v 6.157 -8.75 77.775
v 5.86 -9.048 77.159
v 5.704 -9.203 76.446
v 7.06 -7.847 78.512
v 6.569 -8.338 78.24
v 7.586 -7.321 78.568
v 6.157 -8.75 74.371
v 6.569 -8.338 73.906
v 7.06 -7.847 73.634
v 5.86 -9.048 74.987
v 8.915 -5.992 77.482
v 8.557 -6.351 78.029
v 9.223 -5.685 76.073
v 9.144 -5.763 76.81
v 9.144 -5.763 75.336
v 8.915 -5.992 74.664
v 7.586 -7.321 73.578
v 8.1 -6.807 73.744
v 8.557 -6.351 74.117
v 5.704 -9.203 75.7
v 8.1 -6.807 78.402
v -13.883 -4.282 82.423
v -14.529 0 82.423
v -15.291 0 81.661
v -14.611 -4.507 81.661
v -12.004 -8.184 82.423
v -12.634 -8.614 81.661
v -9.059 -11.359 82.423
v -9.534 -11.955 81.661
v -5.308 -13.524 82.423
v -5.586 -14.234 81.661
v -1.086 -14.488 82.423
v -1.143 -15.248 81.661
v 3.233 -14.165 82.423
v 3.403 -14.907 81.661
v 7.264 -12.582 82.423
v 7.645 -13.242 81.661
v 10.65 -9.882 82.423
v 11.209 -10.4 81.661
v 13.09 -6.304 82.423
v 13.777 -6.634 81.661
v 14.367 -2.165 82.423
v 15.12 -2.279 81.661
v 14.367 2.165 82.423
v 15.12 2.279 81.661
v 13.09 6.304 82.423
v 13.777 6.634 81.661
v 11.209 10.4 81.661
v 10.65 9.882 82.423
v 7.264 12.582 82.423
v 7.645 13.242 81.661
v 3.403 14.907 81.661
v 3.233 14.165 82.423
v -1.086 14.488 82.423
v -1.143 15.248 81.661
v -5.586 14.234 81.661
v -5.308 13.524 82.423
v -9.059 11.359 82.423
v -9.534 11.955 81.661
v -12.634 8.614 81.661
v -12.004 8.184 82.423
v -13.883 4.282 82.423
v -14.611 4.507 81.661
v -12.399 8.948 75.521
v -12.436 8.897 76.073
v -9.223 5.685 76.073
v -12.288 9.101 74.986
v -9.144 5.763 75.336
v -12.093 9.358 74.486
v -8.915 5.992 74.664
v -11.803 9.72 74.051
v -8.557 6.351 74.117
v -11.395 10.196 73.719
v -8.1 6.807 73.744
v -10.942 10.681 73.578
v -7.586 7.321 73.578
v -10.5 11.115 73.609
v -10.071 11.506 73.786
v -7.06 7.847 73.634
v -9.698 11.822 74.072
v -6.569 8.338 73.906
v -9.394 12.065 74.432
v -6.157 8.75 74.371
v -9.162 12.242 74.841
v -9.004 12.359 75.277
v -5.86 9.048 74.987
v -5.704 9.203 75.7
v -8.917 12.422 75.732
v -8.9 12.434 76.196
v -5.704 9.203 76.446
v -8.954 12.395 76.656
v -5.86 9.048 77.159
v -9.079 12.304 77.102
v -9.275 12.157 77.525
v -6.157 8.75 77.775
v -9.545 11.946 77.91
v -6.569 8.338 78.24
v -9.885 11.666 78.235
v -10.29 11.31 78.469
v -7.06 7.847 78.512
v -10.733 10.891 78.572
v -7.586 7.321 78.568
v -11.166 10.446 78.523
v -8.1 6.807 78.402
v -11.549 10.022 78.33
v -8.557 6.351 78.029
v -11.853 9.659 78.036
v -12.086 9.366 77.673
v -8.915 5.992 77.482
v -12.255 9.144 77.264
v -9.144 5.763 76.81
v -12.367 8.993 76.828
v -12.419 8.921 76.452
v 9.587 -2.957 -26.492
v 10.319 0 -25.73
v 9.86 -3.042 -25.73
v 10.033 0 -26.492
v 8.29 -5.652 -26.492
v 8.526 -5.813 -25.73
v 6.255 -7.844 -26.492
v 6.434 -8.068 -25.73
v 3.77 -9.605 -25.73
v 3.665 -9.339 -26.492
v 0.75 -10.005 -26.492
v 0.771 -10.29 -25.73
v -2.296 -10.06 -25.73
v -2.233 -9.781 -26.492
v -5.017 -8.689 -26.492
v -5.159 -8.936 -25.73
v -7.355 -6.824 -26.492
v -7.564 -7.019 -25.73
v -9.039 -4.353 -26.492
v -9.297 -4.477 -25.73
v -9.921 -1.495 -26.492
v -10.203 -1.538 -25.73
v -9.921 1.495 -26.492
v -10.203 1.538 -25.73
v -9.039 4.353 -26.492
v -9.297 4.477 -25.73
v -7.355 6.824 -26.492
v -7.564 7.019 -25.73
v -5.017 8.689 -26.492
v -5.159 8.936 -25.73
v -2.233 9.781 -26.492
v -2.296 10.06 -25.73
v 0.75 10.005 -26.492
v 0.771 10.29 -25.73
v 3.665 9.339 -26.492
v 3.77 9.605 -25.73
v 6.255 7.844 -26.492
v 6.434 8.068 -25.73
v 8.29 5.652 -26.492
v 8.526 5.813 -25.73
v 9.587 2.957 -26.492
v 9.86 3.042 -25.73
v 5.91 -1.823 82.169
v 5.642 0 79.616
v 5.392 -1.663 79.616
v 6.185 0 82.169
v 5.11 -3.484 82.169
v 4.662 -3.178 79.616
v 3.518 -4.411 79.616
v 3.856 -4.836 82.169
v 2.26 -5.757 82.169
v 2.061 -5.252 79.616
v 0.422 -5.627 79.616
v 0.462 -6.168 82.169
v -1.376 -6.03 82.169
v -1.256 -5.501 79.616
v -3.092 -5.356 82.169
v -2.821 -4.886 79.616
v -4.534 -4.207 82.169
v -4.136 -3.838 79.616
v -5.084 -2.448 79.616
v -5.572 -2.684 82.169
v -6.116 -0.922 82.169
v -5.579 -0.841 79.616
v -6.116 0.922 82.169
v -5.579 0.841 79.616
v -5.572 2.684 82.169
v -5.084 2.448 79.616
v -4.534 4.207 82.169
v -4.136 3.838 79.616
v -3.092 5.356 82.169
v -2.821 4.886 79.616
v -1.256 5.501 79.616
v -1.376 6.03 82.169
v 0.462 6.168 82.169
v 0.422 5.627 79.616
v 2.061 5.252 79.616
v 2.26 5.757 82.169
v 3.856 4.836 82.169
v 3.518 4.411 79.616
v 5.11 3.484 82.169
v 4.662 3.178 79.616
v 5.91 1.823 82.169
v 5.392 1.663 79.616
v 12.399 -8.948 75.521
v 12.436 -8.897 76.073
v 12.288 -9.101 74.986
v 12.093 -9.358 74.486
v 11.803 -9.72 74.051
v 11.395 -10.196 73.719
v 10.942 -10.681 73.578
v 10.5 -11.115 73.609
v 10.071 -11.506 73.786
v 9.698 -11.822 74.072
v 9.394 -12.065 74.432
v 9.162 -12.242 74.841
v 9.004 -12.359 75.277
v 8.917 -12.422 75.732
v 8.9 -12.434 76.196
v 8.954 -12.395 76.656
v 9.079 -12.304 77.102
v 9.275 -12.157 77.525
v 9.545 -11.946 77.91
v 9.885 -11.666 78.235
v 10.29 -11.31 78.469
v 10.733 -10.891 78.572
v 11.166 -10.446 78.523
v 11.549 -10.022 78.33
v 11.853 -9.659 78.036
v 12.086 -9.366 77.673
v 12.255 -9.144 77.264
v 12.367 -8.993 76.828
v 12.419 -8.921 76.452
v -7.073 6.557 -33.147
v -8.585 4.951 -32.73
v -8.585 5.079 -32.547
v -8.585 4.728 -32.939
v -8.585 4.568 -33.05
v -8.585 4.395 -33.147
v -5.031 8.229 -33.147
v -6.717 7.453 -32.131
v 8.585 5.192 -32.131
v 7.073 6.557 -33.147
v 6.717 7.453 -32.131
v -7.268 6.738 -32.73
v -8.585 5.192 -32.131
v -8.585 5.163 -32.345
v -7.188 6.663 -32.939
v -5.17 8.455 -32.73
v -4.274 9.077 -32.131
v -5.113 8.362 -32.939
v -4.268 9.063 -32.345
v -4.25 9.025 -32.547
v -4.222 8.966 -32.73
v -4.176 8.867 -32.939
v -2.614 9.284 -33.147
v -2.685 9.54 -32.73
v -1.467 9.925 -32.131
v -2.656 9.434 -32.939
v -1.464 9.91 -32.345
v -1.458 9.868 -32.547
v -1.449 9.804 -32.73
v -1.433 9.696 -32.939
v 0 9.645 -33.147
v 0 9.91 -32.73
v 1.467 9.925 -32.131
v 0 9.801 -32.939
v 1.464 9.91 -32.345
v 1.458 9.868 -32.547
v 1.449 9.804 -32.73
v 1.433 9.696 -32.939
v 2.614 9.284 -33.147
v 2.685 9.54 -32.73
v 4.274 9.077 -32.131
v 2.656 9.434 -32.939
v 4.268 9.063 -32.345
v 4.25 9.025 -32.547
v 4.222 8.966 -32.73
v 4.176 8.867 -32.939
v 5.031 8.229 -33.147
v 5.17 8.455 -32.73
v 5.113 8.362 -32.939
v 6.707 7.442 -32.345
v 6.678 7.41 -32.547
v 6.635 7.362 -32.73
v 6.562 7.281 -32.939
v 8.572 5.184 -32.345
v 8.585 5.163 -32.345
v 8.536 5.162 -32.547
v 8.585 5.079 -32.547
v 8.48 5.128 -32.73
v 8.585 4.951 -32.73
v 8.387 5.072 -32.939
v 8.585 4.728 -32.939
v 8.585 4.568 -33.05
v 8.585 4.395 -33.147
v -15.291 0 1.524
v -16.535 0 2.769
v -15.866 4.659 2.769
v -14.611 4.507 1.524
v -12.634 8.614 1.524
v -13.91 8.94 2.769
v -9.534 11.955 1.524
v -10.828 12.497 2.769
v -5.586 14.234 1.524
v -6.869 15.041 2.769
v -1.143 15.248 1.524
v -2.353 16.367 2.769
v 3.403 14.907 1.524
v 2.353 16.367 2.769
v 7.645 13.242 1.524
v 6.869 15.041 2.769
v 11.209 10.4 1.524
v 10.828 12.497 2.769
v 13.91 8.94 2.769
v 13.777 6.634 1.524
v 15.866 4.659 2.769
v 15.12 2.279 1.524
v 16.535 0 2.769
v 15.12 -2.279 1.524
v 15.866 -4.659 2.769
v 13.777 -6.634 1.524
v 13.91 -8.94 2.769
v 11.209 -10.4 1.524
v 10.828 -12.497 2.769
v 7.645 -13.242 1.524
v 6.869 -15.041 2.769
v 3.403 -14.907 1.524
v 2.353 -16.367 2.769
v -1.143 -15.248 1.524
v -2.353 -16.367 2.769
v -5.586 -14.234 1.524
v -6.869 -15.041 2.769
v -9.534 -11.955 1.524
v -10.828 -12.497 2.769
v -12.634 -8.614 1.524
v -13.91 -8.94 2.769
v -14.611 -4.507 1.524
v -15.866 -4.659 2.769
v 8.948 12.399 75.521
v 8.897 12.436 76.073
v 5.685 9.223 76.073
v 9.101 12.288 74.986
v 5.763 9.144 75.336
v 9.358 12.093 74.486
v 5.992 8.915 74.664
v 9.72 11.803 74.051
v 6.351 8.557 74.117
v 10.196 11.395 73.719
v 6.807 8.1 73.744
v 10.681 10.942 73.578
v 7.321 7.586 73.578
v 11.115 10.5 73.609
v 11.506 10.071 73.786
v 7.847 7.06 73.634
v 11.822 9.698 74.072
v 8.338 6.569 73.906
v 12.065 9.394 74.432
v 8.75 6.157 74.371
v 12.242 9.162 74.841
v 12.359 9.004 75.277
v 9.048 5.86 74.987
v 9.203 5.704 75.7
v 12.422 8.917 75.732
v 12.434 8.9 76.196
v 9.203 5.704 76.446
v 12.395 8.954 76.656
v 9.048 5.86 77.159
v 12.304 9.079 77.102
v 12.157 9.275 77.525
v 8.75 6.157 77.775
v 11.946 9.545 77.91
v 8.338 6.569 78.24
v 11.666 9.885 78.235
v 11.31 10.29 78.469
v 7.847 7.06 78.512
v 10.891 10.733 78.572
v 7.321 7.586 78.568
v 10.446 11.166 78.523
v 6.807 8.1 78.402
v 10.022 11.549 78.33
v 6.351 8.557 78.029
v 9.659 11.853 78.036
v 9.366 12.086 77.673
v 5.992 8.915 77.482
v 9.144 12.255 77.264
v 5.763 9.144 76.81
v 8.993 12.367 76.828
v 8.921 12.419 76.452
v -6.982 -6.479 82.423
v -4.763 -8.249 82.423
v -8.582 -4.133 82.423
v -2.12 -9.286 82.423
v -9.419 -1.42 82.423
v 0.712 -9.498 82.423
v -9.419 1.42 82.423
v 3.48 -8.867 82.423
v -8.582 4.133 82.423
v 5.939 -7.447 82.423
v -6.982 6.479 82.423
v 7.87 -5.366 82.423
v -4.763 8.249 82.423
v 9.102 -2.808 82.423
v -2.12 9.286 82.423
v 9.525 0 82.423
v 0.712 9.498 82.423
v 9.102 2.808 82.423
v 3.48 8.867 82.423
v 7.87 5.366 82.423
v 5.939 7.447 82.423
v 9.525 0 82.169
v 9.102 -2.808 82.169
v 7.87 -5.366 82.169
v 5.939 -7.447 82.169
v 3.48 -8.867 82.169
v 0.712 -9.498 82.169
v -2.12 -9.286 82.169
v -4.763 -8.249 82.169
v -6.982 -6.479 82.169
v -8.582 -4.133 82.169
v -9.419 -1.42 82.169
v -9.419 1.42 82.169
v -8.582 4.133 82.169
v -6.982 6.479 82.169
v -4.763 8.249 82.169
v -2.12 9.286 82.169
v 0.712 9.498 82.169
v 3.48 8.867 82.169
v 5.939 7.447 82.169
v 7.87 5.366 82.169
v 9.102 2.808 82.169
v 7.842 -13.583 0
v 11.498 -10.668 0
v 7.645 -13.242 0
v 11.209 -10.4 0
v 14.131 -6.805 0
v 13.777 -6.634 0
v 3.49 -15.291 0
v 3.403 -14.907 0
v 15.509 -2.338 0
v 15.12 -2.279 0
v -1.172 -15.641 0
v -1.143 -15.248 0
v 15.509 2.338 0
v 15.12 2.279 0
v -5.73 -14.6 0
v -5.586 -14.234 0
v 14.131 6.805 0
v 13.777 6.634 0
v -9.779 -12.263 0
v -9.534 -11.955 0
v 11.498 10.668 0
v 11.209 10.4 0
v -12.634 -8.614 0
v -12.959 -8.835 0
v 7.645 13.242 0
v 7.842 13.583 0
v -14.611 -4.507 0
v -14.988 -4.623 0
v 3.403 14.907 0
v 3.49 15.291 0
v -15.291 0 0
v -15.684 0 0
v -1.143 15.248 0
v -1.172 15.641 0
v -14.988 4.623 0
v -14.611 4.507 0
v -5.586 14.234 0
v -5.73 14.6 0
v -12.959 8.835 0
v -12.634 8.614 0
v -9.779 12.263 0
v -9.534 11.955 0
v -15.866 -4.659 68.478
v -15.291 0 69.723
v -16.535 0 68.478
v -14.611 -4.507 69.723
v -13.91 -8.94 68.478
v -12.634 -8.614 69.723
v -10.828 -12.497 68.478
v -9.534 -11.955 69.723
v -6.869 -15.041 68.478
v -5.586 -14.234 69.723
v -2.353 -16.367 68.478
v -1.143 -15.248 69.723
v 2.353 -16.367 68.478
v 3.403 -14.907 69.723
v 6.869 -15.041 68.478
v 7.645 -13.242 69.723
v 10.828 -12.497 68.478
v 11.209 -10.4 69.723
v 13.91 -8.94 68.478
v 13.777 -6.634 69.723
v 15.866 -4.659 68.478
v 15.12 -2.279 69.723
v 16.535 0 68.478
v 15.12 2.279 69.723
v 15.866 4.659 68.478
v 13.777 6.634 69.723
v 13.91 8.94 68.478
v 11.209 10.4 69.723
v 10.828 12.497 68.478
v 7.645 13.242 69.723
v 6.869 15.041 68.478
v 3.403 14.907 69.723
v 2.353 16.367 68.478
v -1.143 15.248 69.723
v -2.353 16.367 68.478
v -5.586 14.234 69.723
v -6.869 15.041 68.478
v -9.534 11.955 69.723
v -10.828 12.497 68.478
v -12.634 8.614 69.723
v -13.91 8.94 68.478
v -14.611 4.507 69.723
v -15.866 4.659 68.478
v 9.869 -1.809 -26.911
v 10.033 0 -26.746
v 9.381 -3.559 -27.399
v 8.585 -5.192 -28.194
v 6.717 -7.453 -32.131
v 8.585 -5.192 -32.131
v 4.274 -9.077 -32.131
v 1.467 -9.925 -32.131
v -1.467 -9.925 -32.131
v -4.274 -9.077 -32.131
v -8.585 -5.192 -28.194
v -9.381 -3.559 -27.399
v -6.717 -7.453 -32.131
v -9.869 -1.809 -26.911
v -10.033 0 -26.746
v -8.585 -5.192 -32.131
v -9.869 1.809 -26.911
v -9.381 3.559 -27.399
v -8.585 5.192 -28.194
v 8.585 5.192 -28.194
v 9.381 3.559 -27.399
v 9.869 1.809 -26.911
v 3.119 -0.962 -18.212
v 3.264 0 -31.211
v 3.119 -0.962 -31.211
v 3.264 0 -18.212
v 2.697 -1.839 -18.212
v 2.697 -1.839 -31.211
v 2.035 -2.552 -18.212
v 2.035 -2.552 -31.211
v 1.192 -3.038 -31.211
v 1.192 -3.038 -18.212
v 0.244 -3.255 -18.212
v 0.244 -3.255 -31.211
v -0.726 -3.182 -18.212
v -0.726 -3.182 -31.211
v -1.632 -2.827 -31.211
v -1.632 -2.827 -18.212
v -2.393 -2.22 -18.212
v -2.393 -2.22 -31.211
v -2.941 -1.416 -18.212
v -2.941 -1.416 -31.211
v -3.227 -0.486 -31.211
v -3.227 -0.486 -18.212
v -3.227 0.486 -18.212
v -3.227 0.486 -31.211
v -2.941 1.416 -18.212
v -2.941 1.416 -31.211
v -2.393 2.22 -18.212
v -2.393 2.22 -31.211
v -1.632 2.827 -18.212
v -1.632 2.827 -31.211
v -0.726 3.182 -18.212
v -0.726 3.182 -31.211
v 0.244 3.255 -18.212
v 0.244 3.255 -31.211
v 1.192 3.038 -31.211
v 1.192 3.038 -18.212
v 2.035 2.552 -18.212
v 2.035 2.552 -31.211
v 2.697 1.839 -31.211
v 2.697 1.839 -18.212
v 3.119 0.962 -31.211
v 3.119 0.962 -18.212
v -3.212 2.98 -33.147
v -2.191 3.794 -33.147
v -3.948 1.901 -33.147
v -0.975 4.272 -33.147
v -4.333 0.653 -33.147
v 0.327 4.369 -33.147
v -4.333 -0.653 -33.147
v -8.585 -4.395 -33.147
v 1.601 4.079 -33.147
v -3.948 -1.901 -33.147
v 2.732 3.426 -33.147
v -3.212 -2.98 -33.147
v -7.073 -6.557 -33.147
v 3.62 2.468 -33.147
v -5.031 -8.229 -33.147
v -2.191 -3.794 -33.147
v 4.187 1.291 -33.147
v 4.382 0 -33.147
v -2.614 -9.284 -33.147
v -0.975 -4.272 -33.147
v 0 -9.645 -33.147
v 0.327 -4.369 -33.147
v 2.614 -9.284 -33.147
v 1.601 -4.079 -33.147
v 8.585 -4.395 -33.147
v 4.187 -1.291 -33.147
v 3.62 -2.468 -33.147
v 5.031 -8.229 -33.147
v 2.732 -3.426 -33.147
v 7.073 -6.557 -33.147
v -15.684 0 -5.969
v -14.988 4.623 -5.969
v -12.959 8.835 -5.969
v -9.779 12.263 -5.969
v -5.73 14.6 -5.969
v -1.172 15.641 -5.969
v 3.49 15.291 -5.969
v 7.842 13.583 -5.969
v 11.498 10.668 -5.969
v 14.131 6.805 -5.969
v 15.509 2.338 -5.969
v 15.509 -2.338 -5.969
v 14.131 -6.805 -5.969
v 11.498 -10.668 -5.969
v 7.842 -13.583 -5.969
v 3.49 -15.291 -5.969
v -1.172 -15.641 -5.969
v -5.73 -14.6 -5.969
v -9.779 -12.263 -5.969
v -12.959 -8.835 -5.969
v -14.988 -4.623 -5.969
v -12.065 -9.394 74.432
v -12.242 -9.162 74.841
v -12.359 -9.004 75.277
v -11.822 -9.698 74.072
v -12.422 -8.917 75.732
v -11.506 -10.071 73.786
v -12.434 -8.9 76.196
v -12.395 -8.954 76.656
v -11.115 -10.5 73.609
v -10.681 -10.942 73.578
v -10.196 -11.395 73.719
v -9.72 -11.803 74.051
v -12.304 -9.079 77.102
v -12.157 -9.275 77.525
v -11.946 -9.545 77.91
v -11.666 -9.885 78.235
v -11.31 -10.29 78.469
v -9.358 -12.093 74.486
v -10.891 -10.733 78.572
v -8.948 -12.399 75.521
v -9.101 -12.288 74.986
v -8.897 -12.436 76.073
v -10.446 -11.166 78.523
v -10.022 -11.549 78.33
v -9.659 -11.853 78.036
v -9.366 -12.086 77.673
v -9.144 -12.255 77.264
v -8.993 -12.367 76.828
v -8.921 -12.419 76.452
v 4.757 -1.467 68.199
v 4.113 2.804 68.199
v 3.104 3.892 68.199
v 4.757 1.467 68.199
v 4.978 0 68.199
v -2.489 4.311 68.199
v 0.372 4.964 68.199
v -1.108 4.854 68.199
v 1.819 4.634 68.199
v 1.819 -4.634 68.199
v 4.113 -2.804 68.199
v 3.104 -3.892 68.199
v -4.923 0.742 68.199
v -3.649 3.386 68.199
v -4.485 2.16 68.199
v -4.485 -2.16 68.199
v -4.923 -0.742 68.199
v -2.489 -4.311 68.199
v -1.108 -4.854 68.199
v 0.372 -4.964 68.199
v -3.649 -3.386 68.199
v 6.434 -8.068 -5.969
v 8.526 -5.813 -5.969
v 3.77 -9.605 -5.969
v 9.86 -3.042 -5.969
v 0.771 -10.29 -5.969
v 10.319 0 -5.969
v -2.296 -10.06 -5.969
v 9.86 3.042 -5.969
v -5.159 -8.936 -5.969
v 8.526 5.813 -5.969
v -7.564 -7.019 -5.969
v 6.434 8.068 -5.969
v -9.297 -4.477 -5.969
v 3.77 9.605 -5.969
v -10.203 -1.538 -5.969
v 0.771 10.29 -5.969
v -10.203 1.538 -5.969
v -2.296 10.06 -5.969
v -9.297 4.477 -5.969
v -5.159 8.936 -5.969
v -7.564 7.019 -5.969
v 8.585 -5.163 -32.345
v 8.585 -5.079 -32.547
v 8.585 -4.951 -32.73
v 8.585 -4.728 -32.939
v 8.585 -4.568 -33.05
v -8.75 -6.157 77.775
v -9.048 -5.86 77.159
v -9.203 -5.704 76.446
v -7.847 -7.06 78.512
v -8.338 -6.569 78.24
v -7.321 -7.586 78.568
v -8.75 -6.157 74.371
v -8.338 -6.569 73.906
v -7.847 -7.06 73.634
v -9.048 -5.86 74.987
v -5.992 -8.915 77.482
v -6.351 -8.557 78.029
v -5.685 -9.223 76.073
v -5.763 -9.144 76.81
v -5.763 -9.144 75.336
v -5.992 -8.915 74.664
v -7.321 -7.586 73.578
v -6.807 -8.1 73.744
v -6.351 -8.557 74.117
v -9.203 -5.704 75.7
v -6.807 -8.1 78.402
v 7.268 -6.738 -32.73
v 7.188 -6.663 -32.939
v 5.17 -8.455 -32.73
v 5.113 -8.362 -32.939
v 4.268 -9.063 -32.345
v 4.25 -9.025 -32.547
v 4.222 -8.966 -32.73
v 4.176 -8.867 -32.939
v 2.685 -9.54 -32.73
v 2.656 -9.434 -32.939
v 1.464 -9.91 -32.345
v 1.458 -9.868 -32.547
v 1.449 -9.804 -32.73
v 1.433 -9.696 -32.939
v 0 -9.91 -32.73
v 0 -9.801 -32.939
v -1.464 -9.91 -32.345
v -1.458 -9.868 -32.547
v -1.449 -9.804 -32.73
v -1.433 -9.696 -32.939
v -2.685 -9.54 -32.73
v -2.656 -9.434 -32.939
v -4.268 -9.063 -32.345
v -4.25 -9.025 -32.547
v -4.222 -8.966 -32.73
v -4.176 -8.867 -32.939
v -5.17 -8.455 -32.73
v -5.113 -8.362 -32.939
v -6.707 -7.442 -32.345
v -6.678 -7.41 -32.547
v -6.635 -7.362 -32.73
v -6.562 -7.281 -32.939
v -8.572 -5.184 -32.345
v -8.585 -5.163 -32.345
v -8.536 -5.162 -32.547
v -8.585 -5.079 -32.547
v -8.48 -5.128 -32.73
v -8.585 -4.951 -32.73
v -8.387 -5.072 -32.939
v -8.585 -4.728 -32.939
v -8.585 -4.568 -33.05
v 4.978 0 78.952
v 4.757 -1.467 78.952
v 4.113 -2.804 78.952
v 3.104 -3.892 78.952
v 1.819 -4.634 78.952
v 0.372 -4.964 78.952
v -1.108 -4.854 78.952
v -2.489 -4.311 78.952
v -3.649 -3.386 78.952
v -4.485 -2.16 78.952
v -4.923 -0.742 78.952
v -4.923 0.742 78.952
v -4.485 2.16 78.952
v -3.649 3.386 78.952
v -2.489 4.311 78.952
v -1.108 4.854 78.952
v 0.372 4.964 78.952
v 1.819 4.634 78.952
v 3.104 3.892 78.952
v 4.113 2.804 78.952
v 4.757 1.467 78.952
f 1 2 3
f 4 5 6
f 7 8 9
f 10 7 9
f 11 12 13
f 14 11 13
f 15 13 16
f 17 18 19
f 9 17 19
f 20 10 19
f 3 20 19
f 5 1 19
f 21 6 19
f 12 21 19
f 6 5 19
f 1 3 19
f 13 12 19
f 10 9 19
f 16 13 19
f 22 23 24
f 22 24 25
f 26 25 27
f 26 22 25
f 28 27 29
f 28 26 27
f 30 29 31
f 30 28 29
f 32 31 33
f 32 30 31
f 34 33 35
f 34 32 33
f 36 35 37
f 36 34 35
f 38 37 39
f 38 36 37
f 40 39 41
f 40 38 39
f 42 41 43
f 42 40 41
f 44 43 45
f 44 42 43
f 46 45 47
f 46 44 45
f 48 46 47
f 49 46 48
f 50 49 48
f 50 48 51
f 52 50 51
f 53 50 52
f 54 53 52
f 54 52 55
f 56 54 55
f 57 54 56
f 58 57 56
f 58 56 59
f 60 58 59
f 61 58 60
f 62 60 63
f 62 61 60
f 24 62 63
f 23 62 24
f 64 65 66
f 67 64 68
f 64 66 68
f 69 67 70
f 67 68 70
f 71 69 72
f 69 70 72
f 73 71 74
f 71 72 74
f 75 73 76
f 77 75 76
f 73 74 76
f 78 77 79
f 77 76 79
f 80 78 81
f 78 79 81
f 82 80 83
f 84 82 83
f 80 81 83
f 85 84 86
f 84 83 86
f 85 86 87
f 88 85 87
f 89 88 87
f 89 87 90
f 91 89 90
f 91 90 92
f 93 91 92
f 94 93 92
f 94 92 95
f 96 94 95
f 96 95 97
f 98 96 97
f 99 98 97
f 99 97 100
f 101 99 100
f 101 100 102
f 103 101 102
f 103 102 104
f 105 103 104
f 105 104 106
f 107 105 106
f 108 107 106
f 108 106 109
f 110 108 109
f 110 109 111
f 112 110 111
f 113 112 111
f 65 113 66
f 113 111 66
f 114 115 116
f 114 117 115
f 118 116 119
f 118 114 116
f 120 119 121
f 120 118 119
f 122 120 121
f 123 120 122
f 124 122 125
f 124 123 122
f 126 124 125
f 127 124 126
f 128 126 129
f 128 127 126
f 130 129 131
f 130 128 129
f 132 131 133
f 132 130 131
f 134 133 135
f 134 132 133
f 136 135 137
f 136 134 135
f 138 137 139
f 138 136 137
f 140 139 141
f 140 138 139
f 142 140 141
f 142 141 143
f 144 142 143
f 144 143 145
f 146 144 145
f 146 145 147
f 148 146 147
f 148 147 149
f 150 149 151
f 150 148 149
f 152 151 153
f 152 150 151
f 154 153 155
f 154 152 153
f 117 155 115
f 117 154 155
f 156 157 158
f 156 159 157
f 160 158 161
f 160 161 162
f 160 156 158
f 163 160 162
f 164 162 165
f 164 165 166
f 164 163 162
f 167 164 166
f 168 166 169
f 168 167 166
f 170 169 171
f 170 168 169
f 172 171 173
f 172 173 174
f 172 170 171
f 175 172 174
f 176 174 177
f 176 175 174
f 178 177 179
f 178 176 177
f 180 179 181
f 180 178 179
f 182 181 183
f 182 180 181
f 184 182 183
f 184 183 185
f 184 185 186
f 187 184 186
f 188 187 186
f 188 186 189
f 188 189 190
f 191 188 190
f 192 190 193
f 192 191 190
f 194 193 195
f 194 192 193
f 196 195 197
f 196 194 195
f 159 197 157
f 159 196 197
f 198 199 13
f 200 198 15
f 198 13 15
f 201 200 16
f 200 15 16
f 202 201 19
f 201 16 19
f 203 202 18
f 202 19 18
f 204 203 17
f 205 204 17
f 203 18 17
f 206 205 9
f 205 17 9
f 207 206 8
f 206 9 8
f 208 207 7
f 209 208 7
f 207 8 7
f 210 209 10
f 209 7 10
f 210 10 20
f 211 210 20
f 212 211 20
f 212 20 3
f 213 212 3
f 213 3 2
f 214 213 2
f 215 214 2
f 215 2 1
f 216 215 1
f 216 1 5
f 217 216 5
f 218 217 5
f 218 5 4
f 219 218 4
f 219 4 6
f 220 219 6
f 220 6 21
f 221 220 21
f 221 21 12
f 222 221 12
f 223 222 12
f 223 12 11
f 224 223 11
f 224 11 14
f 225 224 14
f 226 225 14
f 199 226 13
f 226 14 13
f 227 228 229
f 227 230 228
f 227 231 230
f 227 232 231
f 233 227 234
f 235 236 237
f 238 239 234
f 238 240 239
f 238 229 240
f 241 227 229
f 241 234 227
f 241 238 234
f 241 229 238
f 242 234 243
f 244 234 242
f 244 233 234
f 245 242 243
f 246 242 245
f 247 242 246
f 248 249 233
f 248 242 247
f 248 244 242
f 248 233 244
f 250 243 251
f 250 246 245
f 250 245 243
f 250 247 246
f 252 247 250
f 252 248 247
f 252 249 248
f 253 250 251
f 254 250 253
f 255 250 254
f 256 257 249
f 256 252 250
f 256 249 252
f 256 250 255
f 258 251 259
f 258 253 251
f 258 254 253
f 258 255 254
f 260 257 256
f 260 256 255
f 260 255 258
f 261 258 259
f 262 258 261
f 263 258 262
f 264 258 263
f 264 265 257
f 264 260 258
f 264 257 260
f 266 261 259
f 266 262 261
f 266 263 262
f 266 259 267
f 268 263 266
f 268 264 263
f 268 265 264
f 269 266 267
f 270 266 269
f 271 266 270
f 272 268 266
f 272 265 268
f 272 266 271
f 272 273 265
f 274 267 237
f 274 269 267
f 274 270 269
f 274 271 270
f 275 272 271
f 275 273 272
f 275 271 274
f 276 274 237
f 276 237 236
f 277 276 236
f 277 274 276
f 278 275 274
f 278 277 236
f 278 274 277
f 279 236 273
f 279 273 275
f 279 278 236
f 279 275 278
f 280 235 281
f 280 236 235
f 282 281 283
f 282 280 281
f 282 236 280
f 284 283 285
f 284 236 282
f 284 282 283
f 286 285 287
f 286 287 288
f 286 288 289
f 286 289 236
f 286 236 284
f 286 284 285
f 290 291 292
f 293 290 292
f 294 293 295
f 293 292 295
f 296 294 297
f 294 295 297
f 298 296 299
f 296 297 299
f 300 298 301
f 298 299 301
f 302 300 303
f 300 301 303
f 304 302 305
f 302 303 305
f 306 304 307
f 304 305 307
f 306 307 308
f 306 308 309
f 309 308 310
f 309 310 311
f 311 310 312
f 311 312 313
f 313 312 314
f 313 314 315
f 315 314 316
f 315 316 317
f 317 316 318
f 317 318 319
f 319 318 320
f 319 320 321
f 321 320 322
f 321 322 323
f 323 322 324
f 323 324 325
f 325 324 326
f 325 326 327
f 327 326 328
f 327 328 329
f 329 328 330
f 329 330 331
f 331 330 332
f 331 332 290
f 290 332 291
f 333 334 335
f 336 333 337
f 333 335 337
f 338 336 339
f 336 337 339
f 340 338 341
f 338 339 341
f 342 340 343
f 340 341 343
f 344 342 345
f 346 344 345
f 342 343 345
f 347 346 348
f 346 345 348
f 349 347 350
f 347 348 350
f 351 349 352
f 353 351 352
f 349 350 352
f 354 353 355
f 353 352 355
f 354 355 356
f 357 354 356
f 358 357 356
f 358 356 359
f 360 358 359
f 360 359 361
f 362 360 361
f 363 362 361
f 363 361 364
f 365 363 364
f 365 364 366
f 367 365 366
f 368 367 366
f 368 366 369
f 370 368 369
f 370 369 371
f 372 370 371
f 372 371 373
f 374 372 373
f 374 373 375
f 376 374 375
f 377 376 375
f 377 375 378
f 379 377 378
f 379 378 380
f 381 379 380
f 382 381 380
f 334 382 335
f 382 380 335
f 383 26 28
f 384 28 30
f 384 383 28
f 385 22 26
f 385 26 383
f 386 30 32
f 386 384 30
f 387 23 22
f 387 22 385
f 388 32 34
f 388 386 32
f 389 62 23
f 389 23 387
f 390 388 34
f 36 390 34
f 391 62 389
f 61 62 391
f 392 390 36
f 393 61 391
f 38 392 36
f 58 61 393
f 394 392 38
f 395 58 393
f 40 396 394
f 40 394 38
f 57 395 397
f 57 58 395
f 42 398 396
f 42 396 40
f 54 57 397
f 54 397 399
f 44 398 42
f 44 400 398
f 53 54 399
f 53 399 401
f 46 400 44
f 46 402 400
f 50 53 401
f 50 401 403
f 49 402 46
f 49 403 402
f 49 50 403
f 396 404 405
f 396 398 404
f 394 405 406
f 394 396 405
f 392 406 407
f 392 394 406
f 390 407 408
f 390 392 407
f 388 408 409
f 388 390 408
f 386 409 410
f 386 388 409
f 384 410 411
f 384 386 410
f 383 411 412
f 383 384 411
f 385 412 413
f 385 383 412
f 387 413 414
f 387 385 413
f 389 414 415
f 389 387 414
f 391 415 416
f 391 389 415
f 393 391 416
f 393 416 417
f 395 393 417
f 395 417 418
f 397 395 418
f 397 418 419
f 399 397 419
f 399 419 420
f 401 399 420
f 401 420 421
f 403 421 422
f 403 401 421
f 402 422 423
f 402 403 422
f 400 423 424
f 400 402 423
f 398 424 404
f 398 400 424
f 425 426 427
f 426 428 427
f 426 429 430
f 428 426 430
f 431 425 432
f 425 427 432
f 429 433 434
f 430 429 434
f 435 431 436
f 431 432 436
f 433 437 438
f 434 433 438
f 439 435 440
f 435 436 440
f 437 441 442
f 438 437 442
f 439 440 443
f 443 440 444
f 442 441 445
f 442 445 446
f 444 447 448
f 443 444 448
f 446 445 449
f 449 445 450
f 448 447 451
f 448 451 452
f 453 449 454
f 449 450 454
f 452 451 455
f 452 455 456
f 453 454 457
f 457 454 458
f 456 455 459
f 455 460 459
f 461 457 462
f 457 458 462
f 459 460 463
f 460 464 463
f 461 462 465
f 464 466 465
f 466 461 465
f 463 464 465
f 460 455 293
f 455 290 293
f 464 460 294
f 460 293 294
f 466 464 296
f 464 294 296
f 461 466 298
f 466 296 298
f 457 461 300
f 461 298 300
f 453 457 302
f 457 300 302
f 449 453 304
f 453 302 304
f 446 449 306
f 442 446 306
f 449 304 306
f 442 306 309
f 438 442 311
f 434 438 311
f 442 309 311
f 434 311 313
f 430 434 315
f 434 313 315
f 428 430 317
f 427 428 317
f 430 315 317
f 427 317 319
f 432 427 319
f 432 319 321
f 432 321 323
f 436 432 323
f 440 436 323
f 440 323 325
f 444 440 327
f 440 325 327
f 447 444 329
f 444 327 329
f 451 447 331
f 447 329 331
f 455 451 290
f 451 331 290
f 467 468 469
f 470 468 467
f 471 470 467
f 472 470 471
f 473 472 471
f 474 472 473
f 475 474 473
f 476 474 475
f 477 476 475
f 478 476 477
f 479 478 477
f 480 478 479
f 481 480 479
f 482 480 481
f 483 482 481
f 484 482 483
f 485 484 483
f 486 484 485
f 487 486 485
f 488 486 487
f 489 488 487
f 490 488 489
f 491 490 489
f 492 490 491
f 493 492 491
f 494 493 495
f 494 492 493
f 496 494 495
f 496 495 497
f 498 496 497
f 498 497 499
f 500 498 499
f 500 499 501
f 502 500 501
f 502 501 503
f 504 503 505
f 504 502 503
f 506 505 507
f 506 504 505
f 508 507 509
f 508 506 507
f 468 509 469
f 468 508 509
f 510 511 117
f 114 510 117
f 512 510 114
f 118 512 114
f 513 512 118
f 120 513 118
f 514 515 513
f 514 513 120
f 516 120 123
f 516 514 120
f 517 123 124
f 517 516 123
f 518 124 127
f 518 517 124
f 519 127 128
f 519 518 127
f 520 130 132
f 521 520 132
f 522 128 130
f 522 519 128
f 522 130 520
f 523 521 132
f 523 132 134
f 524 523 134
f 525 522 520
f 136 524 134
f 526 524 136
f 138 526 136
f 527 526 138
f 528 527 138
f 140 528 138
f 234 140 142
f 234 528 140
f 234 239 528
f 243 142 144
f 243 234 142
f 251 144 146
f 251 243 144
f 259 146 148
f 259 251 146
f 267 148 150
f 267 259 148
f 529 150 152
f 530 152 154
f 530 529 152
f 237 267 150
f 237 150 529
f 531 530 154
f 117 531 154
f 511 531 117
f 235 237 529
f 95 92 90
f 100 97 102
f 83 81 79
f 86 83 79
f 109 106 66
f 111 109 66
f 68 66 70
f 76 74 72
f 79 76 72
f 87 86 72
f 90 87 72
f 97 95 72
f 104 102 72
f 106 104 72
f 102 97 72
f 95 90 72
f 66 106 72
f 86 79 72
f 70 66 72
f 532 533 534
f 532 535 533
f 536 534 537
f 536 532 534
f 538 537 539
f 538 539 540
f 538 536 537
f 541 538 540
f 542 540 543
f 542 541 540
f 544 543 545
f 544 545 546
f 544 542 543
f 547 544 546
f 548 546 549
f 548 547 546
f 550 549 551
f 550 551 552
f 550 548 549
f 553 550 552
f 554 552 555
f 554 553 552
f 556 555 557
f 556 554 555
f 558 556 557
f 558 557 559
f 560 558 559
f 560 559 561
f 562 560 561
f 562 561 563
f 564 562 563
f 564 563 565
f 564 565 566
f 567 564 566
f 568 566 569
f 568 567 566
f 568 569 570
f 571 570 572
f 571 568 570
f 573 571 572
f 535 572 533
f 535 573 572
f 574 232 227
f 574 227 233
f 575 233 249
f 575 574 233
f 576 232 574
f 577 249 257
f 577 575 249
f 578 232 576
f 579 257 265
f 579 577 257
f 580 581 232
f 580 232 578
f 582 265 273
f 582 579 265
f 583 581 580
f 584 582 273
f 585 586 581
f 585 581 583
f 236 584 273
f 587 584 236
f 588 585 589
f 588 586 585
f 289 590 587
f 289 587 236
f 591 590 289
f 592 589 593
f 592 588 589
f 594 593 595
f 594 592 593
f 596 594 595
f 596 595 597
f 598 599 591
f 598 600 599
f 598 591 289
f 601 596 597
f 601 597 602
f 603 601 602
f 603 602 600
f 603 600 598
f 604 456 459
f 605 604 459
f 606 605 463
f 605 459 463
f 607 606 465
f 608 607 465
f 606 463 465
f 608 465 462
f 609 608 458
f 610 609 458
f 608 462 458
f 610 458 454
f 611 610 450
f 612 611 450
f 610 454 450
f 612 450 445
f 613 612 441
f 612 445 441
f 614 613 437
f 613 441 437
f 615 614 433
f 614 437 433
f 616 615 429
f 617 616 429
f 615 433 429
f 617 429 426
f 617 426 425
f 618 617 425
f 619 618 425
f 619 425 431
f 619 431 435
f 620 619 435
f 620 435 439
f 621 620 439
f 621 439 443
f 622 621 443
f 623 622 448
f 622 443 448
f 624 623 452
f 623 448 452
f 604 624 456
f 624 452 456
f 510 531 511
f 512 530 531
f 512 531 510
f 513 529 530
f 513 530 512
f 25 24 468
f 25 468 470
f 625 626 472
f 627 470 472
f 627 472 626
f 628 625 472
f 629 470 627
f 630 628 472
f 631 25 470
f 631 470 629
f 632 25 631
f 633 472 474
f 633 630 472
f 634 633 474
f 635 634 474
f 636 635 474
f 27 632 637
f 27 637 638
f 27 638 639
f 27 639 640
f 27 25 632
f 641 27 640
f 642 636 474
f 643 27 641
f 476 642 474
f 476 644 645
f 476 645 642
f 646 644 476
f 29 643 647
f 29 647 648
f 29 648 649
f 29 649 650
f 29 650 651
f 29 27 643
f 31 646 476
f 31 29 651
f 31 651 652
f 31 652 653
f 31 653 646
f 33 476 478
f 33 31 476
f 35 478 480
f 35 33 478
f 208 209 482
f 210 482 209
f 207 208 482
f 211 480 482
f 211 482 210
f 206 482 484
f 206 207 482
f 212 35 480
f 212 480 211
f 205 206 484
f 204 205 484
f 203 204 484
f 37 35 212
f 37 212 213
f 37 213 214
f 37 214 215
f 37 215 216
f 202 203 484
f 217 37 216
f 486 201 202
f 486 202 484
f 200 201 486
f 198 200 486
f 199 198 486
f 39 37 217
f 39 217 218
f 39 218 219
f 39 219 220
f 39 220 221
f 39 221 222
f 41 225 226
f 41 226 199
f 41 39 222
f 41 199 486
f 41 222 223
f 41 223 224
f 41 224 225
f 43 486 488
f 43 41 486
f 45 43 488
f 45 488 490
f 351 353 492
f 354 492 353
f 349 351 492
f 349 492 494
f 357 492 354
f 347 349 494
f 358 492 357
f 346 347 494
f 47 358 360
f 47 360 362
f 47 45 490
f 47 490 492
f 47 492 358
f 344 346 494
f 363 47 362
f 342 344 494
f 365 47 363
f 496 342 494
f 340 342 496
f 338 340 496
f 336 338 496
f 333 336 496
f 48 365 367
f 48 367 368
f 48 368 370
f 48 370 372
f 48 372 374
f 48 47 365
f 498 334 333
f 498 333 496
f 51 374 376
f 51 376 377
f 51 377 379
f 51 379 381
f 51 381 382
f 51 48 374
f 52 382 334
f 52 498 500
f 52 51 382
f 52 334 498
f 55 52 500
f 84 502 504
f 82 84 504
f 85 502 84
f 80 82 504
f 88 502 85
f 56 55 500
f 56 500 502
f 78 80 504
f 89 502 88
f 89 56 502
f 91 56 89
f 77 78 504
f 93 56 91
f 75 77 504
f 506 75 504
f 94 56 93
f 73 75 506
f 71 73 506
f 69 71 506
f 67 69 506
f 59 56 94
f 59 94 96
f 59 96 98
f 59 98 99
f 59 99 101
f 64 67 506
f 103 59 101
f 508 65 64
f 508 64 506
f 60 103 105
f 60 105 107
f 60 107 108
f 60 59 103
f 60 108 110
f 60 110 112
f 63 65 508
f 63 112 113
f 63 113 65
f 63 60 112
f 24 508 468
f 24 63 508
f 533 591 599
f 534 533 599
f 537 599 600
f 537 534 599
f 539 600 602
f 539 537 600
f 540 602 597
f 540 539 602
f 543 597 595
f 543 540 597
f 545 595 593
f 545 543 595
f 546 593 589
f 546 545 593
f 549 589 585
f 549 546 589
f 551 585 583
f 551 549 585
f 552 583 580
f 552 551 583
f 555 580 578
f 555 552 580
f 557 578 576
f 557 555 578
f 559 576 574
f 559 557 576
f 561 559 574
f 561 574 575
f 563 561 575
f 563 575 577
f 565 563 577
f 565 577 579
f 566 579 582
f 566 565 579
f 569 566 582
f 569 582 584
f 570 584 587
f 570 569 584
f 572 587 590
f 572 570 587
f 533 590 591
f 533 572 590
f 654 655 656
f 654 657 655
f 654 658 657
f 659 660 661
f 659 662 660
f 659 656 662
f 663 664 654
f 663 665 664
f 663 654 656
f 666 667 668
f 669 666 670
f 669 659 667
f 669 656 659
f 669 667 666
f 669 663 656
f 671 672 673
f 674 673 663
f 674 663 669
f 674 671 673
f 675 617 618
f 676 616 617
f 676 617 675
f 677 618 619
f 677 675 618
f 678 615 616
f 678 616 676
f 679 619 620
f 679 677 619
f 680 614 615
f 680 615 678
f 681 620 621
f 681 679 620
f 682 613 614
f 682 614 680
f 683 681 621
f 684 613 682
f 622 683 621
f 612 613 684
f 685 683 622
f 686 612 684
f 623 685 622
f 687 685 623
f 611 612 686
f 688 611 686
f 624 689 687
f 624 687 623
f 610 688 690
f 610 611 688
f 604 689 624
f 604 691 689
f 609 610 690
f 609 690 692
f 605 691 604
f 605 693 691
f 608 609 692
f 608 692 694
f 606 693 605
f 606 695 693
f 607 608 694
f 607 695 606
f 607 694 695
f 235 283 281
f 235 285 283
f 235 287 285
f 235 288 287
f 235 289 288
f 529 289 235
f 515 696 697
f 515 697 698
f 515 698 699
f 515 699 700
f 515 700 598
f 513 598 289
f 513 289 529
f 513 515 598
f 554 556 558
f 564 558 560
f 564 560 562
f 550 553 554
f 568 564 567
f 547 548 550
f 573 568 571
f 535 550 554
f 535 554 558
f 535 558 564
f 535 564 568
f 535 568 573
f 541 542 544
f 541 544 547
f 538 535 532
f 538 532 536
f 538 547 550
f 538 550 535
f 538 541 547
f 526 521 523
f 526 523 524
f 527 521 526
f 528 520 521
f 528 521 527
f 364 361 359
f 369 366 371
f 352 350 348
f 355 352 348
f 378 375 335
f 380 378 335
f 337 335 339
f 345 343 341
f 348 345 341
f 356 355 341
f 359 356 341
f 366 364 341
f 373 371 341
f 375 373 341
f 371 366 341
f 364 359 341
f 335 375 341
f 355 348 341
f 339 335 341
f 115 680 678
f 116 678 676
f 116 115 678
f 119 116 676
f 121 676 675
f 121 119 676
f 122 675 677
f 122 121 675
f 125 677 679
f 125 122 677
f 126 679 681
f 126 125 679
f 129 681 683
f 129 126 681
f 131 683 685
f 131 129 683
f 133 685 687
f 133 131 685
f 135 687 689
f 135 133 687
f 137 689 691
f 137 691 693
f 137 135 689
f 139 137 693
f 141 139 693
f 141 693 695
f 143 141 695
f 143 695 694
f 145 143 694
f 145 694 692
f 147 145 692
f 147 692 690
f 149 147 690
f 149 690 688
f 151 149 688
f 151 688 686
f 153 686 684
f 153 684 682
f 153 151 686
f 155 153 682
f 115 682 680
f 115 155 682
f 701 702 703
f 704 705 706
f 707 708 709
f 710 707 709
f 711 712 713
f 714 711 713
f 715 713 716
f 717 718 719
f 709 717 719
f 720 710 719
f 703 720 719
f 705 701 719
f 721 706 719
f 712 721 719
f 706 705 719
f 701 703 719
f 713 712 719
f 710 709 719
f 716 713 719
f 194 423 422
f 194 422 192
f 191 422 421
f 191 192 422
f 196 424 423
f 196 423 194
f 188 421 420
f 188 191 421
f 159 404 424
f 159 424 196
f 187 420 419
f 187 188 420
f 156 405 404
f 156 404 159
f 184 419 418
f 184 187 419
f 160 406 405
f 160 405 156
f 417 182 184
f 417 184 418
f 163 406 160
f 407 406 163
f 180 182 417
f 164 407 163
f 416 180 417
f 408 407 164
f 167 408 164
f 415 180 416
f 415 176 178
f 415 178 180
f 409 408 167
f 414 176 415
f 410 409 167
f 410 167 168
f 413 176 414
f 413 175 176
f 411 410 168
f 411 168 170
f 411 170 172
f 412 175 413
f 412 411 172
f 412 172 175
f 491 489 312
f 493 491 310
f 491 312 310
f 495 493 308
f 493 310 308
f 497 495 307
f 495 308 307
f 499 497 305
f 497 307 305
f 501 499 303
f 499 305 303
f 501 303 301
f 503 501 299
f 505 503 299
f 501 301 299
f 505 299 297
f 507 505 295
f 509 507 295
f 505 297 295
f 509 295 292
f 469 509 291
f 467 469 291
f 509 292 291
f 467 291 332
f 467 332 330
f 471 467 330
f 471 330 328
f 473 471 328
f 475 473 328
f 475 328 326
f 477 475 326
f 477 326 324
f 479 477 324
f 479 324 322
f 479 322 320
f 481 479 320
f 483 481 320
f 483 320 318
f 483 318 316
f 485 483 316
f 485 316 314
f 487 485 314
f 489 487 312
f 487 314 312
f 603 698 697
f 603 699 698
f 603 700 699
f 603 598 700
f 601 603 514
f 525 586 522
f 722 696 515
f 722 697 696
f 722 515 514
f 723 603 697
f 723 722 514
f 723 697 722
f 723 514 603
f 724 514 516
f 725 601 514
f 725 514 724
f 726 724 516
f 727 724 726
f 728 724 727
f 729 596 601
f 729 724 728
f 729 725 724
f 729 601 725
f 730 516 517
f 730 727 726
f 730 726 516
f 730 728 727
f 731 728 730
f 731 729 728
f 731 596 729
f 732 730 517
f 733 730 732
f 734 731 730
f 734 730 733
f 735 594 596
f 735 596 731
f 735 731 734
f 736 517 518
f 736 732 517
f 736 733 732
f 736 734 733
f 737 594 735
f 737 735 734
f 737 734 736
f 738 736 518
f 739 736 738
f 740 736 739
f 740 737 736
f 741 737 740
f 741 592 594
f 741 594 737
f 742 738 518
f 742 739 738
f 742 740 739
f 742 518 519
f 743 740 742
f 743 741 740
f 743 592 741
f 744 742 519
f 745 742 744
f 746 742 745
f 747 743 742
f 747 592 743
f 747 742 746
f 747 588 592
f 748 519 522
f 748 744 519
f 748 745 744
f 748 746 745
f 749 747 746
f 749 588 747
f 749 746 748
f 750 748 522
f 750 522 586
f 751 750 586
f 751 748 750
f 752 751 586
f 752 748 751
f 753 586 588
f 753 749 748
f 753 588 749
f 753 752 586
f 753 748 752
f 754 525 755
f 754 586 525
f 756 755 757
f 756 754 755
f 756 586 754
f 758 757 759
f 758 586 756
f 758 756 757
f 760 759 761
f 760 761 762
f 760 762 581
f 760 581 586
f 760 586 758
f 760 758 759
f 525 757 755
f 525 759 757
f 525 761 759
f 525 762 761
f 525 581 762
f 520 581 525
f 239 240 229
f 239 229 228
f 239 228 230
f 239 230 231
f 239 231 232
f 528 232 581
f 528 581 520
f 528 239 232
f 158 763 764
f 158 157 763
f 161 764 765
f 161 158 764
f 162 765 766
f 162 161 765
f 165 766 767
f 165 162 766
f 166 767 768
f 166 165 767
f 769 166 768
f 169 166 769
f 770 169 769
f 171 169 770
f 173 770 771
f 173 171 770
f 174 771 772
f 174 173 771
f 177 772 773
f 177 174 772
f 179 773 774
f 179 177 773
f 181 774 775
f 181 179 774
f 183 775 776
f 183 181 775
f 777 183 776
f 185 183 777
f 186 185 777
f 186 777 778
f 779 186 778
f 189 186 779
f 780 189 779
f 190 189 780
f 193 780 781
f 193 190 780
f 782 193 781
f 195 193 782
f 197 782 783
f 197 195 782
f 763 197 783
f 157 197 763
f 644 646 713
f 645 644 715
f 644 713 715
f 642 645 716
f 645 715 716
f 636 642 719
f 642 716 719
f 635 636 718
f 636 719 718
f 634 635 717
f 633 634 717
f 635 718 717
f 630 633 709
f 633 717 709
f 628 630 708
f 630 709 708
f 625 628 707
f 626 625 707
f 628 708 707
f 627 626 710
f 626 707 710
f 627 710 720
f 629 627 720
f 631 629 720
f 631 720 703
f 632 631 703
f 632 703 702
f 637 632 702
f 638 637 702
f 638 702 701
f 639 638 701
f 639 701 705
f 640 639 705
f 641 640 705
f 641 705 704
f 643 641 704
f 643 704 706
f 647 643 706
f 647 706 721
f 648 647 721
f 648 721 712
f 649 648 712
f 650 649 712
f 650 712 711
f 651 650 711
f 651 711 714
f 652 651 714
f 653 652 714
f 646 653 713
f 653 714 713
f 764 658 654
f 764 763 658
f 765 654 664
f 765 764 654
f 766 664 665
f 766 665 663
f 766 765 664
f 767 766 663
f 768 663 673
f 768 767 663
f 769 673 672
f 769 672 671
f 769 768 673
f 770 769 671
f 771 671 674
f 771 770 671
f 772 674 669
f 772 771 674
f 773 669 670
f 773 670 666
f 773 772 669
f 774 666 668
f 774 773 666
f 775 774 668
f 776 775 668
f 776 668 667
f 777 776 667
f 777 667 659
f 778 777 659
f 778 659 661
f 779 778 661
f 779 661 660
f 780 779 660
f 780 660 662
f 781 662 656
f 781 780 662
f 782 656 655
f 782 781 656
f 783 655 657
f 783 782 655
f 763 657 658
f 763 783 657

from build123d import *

# Parameters (mm, degrees)
SKETCH1_R          = 16.5354
EXTRUDE1_DEPTH     = 82.423
CHAMFER1_SIZE      = 0.762
SKETCH6_R          = 15.6845
EXTRUDE2_DEPTH     = 5.969
SKETCH7_W          = 27.178
SKETCH7_H          = 10.31875
CUT_EXTRUDE4_DEPTH = 19.84248
HOLE1_D            = 5.0038
HOLE1_DEPTH        = 4.7498
CIRPATTERN1_COUNT  = 4


with BuildPart() as part:
    # Sketch1 → Extrude1 (new body)
    with BuildSketch(Plane.XY):
        Circle(SKETCH1_R)
    extrude(amount=EXTRUDE1_DEPTH)

    # Sketch2 → Cut-Revolve1 (revolve, cut)
    with BuildSketch(Plane(origin=(0, 0, 0), x_dir=(1, 0, 0), z_dir=(0, 1, 0)), mode=Mode.PRIVATE) as cut_revolve1_sk:
        Polygon((16.5354, -82.423), (16.5354, -68.4784), (15.2908, -69.723), (15.2908, -82.423), align=None)
    revolve(cut_revolve1_sk.sketch.rotate(Axis((0, 0, 0), (0, 0, 1)), 180), axis=Axis((0, 0, 0), (0, 0, 1)), mode=Mode.SUBTRACT)  # turned: the seam where the file's is

    # Sketch3 → Cut-Revolve2 (revolve, cut)
    with BuildSketch(Plane(origin=(0, 0, 0), x_dir=(1, 0, 0), z_dir=(0, 1, 0)), mode=Mode.PRIVATE) as cut_revolve2_sk:
        Polygon((15.2908, 0), (15.2908, -1.524), (16.5354, -2.7686), (16.5354, 0), align=None)
    revolve(cut_revolve2_sk.sketch.rotate(Axis((0, 0, 0), (0, 0, -1)), 180), axis=Axis((0, 0, 0), (0, 0, -1)), mode=Mode.SUBTRACT)  # turned: the seam where the file's is

    # S2D0002 → Cut-Revolve3 (revolve, cut)
    with BuildSketch(Plane(origin=(0, 0, 0), x_dir=(1, 0, 0), z_dir=(0, 1, 0))):
        Polygon((6.1849, -82.169), (9.525, -82.169), (9.525, -82.423), (0, -82.423), (0, -68.199), (4.9784, -68.199), (4.9784, -78.952393135), (5.642306865, -79.6163), align=None)
    revolve(axis=Axis((0, 0, 14.6685), (0, 0, -1)), mode=Mode.SUBTRACT)

    # Chamfer1
    chamfer1_edges = [part.edges().sort_by_distance(p)[0] for p in [
        (15.2908, 0, 82.423),
    ]]
    chamfer(chamfer1_edges, length=CHAMFER1_SIZE)

    # Sketch6 → Extrude2 (add)
    with BuildSketch(Plane(origin=(0, 0, 0), x_dir=(-1, 0, 0), z_dir=(0, 0, -1))):
        Circle(SKETCH6_R)
    extrude(amount=EXTRUDE2_DEPTH)

    # Sketch7 → Revolve1 (revolve)
    with BuildSketch(Plane(origin=(0, 0, 0), x_dir=(0, 0, -1), z_dir=(1, 0, 0)), mode=Mode.PRIVATE) as revolve1_sk:
        with Locations((19.558, -5.159375)):
            Rectangle(SKETCH7_W, SKETCH7_H)
    revolve(revolve1_sk.sketch.rotate(Axis((0, 0, 0), (0, 0, -1)), 270), axis=Axis((0, 0, 0), (0, 0, -1)))  # turned: the seam where the file's is

    # S2D0001 → Cut-Revolve5 (revolve, cut)
    with BuildSketch(Plane(origin=(0, 0, 0), x_dir=(1, 0, 0), z_dir=(0, 1, 0))):
        Polygon((3.2639, 31.211260017), (3.2639, 18.2118), (0, 18.2118), (0, 33.147), (4.3815, 33.147), align=None)
    revolve(axis=Axis((0, 0, 31.308359971), (0, 0, -1)), mode=Mode.SUBTRACT)

    # Sketch9 → Cut-Revolve6 (revolve, cut)
    with BuildSketch(Plane(origin=(0, 0, 0), x_dir=(0, -1, 0), z_dir=(1, 0, 0)), mode=Mode.PRIVATE) as cut_revolve6_sk:
        with BuildLine():
            Line((-10.31875, 25.7302), (-10.033, 26.4922))
            Line((-10.033, 26.4922), (-10.033, 32.131))
            ThreePointArc((-10.033, 32.131), (-9.932678675, 32.674796865), (-9.644922533, 33.147))
            Line((-9.644922533, 33.147), (-10.31875, 33.147))
            Line((-10.31875, 33.147), (-10.31875, 25.7302))
        make_face()
    revolve(cut_revolve6_sk.sketch.rotate(Axis((0, 0, -12.65936), (0, 0, -1)), 90), axis=Axis((0, 0, -12.65936), (0, 0, -1)), mode=Mode.SUBTRACT)  # turned: the seam where the file's is

    # Sketch13 → Cut-Extrude4 (cut, symmetric)
    with BuildSketch(Plane(origin=(0, 0, 0), x_dir=(1, 0, 0), z_dir=(0, 1, 0))):
        Polygon((8.5852, 33.147), (8.5852, 28.194), (10.033, 26.7462), (10.033, 33.147), align=None)
        Polygon((-8.5852, 33.147), (-8.5852, 28.194), (-10.033, 26.7462), (-10.033, 33.147), align=None)
    extrude(amount=CUT_EXTRUDE4_DEPTH, both=True, mode=Mode.SUBTRACT)

    # Hole1
    with Locations(Plane(origin=(-10.81222837, 10.81222837, 76.073), x_dir=(0.707106781, 0.707106781, 0), z_dir=(-0.707106781, 0.707106781, 0))):
        with Locations((0, 0)):
            hole1 = Hole(HOLE1_D / 2, depth=HOLE1_DEPTH)

    # CirPattern1: Hole1 ×4 about axis
    cirpattern1_axis = Axis((0, 0, 0), (0, 0, 1))
    for i in range(1, CIRPATTERN1_COUNT):
        add(hole1.rotate(cirpattern1_axis, i * 360 / CIRPATTERN1_COUNT), mode=Mode.SUBTRACT)


solid = part.part
